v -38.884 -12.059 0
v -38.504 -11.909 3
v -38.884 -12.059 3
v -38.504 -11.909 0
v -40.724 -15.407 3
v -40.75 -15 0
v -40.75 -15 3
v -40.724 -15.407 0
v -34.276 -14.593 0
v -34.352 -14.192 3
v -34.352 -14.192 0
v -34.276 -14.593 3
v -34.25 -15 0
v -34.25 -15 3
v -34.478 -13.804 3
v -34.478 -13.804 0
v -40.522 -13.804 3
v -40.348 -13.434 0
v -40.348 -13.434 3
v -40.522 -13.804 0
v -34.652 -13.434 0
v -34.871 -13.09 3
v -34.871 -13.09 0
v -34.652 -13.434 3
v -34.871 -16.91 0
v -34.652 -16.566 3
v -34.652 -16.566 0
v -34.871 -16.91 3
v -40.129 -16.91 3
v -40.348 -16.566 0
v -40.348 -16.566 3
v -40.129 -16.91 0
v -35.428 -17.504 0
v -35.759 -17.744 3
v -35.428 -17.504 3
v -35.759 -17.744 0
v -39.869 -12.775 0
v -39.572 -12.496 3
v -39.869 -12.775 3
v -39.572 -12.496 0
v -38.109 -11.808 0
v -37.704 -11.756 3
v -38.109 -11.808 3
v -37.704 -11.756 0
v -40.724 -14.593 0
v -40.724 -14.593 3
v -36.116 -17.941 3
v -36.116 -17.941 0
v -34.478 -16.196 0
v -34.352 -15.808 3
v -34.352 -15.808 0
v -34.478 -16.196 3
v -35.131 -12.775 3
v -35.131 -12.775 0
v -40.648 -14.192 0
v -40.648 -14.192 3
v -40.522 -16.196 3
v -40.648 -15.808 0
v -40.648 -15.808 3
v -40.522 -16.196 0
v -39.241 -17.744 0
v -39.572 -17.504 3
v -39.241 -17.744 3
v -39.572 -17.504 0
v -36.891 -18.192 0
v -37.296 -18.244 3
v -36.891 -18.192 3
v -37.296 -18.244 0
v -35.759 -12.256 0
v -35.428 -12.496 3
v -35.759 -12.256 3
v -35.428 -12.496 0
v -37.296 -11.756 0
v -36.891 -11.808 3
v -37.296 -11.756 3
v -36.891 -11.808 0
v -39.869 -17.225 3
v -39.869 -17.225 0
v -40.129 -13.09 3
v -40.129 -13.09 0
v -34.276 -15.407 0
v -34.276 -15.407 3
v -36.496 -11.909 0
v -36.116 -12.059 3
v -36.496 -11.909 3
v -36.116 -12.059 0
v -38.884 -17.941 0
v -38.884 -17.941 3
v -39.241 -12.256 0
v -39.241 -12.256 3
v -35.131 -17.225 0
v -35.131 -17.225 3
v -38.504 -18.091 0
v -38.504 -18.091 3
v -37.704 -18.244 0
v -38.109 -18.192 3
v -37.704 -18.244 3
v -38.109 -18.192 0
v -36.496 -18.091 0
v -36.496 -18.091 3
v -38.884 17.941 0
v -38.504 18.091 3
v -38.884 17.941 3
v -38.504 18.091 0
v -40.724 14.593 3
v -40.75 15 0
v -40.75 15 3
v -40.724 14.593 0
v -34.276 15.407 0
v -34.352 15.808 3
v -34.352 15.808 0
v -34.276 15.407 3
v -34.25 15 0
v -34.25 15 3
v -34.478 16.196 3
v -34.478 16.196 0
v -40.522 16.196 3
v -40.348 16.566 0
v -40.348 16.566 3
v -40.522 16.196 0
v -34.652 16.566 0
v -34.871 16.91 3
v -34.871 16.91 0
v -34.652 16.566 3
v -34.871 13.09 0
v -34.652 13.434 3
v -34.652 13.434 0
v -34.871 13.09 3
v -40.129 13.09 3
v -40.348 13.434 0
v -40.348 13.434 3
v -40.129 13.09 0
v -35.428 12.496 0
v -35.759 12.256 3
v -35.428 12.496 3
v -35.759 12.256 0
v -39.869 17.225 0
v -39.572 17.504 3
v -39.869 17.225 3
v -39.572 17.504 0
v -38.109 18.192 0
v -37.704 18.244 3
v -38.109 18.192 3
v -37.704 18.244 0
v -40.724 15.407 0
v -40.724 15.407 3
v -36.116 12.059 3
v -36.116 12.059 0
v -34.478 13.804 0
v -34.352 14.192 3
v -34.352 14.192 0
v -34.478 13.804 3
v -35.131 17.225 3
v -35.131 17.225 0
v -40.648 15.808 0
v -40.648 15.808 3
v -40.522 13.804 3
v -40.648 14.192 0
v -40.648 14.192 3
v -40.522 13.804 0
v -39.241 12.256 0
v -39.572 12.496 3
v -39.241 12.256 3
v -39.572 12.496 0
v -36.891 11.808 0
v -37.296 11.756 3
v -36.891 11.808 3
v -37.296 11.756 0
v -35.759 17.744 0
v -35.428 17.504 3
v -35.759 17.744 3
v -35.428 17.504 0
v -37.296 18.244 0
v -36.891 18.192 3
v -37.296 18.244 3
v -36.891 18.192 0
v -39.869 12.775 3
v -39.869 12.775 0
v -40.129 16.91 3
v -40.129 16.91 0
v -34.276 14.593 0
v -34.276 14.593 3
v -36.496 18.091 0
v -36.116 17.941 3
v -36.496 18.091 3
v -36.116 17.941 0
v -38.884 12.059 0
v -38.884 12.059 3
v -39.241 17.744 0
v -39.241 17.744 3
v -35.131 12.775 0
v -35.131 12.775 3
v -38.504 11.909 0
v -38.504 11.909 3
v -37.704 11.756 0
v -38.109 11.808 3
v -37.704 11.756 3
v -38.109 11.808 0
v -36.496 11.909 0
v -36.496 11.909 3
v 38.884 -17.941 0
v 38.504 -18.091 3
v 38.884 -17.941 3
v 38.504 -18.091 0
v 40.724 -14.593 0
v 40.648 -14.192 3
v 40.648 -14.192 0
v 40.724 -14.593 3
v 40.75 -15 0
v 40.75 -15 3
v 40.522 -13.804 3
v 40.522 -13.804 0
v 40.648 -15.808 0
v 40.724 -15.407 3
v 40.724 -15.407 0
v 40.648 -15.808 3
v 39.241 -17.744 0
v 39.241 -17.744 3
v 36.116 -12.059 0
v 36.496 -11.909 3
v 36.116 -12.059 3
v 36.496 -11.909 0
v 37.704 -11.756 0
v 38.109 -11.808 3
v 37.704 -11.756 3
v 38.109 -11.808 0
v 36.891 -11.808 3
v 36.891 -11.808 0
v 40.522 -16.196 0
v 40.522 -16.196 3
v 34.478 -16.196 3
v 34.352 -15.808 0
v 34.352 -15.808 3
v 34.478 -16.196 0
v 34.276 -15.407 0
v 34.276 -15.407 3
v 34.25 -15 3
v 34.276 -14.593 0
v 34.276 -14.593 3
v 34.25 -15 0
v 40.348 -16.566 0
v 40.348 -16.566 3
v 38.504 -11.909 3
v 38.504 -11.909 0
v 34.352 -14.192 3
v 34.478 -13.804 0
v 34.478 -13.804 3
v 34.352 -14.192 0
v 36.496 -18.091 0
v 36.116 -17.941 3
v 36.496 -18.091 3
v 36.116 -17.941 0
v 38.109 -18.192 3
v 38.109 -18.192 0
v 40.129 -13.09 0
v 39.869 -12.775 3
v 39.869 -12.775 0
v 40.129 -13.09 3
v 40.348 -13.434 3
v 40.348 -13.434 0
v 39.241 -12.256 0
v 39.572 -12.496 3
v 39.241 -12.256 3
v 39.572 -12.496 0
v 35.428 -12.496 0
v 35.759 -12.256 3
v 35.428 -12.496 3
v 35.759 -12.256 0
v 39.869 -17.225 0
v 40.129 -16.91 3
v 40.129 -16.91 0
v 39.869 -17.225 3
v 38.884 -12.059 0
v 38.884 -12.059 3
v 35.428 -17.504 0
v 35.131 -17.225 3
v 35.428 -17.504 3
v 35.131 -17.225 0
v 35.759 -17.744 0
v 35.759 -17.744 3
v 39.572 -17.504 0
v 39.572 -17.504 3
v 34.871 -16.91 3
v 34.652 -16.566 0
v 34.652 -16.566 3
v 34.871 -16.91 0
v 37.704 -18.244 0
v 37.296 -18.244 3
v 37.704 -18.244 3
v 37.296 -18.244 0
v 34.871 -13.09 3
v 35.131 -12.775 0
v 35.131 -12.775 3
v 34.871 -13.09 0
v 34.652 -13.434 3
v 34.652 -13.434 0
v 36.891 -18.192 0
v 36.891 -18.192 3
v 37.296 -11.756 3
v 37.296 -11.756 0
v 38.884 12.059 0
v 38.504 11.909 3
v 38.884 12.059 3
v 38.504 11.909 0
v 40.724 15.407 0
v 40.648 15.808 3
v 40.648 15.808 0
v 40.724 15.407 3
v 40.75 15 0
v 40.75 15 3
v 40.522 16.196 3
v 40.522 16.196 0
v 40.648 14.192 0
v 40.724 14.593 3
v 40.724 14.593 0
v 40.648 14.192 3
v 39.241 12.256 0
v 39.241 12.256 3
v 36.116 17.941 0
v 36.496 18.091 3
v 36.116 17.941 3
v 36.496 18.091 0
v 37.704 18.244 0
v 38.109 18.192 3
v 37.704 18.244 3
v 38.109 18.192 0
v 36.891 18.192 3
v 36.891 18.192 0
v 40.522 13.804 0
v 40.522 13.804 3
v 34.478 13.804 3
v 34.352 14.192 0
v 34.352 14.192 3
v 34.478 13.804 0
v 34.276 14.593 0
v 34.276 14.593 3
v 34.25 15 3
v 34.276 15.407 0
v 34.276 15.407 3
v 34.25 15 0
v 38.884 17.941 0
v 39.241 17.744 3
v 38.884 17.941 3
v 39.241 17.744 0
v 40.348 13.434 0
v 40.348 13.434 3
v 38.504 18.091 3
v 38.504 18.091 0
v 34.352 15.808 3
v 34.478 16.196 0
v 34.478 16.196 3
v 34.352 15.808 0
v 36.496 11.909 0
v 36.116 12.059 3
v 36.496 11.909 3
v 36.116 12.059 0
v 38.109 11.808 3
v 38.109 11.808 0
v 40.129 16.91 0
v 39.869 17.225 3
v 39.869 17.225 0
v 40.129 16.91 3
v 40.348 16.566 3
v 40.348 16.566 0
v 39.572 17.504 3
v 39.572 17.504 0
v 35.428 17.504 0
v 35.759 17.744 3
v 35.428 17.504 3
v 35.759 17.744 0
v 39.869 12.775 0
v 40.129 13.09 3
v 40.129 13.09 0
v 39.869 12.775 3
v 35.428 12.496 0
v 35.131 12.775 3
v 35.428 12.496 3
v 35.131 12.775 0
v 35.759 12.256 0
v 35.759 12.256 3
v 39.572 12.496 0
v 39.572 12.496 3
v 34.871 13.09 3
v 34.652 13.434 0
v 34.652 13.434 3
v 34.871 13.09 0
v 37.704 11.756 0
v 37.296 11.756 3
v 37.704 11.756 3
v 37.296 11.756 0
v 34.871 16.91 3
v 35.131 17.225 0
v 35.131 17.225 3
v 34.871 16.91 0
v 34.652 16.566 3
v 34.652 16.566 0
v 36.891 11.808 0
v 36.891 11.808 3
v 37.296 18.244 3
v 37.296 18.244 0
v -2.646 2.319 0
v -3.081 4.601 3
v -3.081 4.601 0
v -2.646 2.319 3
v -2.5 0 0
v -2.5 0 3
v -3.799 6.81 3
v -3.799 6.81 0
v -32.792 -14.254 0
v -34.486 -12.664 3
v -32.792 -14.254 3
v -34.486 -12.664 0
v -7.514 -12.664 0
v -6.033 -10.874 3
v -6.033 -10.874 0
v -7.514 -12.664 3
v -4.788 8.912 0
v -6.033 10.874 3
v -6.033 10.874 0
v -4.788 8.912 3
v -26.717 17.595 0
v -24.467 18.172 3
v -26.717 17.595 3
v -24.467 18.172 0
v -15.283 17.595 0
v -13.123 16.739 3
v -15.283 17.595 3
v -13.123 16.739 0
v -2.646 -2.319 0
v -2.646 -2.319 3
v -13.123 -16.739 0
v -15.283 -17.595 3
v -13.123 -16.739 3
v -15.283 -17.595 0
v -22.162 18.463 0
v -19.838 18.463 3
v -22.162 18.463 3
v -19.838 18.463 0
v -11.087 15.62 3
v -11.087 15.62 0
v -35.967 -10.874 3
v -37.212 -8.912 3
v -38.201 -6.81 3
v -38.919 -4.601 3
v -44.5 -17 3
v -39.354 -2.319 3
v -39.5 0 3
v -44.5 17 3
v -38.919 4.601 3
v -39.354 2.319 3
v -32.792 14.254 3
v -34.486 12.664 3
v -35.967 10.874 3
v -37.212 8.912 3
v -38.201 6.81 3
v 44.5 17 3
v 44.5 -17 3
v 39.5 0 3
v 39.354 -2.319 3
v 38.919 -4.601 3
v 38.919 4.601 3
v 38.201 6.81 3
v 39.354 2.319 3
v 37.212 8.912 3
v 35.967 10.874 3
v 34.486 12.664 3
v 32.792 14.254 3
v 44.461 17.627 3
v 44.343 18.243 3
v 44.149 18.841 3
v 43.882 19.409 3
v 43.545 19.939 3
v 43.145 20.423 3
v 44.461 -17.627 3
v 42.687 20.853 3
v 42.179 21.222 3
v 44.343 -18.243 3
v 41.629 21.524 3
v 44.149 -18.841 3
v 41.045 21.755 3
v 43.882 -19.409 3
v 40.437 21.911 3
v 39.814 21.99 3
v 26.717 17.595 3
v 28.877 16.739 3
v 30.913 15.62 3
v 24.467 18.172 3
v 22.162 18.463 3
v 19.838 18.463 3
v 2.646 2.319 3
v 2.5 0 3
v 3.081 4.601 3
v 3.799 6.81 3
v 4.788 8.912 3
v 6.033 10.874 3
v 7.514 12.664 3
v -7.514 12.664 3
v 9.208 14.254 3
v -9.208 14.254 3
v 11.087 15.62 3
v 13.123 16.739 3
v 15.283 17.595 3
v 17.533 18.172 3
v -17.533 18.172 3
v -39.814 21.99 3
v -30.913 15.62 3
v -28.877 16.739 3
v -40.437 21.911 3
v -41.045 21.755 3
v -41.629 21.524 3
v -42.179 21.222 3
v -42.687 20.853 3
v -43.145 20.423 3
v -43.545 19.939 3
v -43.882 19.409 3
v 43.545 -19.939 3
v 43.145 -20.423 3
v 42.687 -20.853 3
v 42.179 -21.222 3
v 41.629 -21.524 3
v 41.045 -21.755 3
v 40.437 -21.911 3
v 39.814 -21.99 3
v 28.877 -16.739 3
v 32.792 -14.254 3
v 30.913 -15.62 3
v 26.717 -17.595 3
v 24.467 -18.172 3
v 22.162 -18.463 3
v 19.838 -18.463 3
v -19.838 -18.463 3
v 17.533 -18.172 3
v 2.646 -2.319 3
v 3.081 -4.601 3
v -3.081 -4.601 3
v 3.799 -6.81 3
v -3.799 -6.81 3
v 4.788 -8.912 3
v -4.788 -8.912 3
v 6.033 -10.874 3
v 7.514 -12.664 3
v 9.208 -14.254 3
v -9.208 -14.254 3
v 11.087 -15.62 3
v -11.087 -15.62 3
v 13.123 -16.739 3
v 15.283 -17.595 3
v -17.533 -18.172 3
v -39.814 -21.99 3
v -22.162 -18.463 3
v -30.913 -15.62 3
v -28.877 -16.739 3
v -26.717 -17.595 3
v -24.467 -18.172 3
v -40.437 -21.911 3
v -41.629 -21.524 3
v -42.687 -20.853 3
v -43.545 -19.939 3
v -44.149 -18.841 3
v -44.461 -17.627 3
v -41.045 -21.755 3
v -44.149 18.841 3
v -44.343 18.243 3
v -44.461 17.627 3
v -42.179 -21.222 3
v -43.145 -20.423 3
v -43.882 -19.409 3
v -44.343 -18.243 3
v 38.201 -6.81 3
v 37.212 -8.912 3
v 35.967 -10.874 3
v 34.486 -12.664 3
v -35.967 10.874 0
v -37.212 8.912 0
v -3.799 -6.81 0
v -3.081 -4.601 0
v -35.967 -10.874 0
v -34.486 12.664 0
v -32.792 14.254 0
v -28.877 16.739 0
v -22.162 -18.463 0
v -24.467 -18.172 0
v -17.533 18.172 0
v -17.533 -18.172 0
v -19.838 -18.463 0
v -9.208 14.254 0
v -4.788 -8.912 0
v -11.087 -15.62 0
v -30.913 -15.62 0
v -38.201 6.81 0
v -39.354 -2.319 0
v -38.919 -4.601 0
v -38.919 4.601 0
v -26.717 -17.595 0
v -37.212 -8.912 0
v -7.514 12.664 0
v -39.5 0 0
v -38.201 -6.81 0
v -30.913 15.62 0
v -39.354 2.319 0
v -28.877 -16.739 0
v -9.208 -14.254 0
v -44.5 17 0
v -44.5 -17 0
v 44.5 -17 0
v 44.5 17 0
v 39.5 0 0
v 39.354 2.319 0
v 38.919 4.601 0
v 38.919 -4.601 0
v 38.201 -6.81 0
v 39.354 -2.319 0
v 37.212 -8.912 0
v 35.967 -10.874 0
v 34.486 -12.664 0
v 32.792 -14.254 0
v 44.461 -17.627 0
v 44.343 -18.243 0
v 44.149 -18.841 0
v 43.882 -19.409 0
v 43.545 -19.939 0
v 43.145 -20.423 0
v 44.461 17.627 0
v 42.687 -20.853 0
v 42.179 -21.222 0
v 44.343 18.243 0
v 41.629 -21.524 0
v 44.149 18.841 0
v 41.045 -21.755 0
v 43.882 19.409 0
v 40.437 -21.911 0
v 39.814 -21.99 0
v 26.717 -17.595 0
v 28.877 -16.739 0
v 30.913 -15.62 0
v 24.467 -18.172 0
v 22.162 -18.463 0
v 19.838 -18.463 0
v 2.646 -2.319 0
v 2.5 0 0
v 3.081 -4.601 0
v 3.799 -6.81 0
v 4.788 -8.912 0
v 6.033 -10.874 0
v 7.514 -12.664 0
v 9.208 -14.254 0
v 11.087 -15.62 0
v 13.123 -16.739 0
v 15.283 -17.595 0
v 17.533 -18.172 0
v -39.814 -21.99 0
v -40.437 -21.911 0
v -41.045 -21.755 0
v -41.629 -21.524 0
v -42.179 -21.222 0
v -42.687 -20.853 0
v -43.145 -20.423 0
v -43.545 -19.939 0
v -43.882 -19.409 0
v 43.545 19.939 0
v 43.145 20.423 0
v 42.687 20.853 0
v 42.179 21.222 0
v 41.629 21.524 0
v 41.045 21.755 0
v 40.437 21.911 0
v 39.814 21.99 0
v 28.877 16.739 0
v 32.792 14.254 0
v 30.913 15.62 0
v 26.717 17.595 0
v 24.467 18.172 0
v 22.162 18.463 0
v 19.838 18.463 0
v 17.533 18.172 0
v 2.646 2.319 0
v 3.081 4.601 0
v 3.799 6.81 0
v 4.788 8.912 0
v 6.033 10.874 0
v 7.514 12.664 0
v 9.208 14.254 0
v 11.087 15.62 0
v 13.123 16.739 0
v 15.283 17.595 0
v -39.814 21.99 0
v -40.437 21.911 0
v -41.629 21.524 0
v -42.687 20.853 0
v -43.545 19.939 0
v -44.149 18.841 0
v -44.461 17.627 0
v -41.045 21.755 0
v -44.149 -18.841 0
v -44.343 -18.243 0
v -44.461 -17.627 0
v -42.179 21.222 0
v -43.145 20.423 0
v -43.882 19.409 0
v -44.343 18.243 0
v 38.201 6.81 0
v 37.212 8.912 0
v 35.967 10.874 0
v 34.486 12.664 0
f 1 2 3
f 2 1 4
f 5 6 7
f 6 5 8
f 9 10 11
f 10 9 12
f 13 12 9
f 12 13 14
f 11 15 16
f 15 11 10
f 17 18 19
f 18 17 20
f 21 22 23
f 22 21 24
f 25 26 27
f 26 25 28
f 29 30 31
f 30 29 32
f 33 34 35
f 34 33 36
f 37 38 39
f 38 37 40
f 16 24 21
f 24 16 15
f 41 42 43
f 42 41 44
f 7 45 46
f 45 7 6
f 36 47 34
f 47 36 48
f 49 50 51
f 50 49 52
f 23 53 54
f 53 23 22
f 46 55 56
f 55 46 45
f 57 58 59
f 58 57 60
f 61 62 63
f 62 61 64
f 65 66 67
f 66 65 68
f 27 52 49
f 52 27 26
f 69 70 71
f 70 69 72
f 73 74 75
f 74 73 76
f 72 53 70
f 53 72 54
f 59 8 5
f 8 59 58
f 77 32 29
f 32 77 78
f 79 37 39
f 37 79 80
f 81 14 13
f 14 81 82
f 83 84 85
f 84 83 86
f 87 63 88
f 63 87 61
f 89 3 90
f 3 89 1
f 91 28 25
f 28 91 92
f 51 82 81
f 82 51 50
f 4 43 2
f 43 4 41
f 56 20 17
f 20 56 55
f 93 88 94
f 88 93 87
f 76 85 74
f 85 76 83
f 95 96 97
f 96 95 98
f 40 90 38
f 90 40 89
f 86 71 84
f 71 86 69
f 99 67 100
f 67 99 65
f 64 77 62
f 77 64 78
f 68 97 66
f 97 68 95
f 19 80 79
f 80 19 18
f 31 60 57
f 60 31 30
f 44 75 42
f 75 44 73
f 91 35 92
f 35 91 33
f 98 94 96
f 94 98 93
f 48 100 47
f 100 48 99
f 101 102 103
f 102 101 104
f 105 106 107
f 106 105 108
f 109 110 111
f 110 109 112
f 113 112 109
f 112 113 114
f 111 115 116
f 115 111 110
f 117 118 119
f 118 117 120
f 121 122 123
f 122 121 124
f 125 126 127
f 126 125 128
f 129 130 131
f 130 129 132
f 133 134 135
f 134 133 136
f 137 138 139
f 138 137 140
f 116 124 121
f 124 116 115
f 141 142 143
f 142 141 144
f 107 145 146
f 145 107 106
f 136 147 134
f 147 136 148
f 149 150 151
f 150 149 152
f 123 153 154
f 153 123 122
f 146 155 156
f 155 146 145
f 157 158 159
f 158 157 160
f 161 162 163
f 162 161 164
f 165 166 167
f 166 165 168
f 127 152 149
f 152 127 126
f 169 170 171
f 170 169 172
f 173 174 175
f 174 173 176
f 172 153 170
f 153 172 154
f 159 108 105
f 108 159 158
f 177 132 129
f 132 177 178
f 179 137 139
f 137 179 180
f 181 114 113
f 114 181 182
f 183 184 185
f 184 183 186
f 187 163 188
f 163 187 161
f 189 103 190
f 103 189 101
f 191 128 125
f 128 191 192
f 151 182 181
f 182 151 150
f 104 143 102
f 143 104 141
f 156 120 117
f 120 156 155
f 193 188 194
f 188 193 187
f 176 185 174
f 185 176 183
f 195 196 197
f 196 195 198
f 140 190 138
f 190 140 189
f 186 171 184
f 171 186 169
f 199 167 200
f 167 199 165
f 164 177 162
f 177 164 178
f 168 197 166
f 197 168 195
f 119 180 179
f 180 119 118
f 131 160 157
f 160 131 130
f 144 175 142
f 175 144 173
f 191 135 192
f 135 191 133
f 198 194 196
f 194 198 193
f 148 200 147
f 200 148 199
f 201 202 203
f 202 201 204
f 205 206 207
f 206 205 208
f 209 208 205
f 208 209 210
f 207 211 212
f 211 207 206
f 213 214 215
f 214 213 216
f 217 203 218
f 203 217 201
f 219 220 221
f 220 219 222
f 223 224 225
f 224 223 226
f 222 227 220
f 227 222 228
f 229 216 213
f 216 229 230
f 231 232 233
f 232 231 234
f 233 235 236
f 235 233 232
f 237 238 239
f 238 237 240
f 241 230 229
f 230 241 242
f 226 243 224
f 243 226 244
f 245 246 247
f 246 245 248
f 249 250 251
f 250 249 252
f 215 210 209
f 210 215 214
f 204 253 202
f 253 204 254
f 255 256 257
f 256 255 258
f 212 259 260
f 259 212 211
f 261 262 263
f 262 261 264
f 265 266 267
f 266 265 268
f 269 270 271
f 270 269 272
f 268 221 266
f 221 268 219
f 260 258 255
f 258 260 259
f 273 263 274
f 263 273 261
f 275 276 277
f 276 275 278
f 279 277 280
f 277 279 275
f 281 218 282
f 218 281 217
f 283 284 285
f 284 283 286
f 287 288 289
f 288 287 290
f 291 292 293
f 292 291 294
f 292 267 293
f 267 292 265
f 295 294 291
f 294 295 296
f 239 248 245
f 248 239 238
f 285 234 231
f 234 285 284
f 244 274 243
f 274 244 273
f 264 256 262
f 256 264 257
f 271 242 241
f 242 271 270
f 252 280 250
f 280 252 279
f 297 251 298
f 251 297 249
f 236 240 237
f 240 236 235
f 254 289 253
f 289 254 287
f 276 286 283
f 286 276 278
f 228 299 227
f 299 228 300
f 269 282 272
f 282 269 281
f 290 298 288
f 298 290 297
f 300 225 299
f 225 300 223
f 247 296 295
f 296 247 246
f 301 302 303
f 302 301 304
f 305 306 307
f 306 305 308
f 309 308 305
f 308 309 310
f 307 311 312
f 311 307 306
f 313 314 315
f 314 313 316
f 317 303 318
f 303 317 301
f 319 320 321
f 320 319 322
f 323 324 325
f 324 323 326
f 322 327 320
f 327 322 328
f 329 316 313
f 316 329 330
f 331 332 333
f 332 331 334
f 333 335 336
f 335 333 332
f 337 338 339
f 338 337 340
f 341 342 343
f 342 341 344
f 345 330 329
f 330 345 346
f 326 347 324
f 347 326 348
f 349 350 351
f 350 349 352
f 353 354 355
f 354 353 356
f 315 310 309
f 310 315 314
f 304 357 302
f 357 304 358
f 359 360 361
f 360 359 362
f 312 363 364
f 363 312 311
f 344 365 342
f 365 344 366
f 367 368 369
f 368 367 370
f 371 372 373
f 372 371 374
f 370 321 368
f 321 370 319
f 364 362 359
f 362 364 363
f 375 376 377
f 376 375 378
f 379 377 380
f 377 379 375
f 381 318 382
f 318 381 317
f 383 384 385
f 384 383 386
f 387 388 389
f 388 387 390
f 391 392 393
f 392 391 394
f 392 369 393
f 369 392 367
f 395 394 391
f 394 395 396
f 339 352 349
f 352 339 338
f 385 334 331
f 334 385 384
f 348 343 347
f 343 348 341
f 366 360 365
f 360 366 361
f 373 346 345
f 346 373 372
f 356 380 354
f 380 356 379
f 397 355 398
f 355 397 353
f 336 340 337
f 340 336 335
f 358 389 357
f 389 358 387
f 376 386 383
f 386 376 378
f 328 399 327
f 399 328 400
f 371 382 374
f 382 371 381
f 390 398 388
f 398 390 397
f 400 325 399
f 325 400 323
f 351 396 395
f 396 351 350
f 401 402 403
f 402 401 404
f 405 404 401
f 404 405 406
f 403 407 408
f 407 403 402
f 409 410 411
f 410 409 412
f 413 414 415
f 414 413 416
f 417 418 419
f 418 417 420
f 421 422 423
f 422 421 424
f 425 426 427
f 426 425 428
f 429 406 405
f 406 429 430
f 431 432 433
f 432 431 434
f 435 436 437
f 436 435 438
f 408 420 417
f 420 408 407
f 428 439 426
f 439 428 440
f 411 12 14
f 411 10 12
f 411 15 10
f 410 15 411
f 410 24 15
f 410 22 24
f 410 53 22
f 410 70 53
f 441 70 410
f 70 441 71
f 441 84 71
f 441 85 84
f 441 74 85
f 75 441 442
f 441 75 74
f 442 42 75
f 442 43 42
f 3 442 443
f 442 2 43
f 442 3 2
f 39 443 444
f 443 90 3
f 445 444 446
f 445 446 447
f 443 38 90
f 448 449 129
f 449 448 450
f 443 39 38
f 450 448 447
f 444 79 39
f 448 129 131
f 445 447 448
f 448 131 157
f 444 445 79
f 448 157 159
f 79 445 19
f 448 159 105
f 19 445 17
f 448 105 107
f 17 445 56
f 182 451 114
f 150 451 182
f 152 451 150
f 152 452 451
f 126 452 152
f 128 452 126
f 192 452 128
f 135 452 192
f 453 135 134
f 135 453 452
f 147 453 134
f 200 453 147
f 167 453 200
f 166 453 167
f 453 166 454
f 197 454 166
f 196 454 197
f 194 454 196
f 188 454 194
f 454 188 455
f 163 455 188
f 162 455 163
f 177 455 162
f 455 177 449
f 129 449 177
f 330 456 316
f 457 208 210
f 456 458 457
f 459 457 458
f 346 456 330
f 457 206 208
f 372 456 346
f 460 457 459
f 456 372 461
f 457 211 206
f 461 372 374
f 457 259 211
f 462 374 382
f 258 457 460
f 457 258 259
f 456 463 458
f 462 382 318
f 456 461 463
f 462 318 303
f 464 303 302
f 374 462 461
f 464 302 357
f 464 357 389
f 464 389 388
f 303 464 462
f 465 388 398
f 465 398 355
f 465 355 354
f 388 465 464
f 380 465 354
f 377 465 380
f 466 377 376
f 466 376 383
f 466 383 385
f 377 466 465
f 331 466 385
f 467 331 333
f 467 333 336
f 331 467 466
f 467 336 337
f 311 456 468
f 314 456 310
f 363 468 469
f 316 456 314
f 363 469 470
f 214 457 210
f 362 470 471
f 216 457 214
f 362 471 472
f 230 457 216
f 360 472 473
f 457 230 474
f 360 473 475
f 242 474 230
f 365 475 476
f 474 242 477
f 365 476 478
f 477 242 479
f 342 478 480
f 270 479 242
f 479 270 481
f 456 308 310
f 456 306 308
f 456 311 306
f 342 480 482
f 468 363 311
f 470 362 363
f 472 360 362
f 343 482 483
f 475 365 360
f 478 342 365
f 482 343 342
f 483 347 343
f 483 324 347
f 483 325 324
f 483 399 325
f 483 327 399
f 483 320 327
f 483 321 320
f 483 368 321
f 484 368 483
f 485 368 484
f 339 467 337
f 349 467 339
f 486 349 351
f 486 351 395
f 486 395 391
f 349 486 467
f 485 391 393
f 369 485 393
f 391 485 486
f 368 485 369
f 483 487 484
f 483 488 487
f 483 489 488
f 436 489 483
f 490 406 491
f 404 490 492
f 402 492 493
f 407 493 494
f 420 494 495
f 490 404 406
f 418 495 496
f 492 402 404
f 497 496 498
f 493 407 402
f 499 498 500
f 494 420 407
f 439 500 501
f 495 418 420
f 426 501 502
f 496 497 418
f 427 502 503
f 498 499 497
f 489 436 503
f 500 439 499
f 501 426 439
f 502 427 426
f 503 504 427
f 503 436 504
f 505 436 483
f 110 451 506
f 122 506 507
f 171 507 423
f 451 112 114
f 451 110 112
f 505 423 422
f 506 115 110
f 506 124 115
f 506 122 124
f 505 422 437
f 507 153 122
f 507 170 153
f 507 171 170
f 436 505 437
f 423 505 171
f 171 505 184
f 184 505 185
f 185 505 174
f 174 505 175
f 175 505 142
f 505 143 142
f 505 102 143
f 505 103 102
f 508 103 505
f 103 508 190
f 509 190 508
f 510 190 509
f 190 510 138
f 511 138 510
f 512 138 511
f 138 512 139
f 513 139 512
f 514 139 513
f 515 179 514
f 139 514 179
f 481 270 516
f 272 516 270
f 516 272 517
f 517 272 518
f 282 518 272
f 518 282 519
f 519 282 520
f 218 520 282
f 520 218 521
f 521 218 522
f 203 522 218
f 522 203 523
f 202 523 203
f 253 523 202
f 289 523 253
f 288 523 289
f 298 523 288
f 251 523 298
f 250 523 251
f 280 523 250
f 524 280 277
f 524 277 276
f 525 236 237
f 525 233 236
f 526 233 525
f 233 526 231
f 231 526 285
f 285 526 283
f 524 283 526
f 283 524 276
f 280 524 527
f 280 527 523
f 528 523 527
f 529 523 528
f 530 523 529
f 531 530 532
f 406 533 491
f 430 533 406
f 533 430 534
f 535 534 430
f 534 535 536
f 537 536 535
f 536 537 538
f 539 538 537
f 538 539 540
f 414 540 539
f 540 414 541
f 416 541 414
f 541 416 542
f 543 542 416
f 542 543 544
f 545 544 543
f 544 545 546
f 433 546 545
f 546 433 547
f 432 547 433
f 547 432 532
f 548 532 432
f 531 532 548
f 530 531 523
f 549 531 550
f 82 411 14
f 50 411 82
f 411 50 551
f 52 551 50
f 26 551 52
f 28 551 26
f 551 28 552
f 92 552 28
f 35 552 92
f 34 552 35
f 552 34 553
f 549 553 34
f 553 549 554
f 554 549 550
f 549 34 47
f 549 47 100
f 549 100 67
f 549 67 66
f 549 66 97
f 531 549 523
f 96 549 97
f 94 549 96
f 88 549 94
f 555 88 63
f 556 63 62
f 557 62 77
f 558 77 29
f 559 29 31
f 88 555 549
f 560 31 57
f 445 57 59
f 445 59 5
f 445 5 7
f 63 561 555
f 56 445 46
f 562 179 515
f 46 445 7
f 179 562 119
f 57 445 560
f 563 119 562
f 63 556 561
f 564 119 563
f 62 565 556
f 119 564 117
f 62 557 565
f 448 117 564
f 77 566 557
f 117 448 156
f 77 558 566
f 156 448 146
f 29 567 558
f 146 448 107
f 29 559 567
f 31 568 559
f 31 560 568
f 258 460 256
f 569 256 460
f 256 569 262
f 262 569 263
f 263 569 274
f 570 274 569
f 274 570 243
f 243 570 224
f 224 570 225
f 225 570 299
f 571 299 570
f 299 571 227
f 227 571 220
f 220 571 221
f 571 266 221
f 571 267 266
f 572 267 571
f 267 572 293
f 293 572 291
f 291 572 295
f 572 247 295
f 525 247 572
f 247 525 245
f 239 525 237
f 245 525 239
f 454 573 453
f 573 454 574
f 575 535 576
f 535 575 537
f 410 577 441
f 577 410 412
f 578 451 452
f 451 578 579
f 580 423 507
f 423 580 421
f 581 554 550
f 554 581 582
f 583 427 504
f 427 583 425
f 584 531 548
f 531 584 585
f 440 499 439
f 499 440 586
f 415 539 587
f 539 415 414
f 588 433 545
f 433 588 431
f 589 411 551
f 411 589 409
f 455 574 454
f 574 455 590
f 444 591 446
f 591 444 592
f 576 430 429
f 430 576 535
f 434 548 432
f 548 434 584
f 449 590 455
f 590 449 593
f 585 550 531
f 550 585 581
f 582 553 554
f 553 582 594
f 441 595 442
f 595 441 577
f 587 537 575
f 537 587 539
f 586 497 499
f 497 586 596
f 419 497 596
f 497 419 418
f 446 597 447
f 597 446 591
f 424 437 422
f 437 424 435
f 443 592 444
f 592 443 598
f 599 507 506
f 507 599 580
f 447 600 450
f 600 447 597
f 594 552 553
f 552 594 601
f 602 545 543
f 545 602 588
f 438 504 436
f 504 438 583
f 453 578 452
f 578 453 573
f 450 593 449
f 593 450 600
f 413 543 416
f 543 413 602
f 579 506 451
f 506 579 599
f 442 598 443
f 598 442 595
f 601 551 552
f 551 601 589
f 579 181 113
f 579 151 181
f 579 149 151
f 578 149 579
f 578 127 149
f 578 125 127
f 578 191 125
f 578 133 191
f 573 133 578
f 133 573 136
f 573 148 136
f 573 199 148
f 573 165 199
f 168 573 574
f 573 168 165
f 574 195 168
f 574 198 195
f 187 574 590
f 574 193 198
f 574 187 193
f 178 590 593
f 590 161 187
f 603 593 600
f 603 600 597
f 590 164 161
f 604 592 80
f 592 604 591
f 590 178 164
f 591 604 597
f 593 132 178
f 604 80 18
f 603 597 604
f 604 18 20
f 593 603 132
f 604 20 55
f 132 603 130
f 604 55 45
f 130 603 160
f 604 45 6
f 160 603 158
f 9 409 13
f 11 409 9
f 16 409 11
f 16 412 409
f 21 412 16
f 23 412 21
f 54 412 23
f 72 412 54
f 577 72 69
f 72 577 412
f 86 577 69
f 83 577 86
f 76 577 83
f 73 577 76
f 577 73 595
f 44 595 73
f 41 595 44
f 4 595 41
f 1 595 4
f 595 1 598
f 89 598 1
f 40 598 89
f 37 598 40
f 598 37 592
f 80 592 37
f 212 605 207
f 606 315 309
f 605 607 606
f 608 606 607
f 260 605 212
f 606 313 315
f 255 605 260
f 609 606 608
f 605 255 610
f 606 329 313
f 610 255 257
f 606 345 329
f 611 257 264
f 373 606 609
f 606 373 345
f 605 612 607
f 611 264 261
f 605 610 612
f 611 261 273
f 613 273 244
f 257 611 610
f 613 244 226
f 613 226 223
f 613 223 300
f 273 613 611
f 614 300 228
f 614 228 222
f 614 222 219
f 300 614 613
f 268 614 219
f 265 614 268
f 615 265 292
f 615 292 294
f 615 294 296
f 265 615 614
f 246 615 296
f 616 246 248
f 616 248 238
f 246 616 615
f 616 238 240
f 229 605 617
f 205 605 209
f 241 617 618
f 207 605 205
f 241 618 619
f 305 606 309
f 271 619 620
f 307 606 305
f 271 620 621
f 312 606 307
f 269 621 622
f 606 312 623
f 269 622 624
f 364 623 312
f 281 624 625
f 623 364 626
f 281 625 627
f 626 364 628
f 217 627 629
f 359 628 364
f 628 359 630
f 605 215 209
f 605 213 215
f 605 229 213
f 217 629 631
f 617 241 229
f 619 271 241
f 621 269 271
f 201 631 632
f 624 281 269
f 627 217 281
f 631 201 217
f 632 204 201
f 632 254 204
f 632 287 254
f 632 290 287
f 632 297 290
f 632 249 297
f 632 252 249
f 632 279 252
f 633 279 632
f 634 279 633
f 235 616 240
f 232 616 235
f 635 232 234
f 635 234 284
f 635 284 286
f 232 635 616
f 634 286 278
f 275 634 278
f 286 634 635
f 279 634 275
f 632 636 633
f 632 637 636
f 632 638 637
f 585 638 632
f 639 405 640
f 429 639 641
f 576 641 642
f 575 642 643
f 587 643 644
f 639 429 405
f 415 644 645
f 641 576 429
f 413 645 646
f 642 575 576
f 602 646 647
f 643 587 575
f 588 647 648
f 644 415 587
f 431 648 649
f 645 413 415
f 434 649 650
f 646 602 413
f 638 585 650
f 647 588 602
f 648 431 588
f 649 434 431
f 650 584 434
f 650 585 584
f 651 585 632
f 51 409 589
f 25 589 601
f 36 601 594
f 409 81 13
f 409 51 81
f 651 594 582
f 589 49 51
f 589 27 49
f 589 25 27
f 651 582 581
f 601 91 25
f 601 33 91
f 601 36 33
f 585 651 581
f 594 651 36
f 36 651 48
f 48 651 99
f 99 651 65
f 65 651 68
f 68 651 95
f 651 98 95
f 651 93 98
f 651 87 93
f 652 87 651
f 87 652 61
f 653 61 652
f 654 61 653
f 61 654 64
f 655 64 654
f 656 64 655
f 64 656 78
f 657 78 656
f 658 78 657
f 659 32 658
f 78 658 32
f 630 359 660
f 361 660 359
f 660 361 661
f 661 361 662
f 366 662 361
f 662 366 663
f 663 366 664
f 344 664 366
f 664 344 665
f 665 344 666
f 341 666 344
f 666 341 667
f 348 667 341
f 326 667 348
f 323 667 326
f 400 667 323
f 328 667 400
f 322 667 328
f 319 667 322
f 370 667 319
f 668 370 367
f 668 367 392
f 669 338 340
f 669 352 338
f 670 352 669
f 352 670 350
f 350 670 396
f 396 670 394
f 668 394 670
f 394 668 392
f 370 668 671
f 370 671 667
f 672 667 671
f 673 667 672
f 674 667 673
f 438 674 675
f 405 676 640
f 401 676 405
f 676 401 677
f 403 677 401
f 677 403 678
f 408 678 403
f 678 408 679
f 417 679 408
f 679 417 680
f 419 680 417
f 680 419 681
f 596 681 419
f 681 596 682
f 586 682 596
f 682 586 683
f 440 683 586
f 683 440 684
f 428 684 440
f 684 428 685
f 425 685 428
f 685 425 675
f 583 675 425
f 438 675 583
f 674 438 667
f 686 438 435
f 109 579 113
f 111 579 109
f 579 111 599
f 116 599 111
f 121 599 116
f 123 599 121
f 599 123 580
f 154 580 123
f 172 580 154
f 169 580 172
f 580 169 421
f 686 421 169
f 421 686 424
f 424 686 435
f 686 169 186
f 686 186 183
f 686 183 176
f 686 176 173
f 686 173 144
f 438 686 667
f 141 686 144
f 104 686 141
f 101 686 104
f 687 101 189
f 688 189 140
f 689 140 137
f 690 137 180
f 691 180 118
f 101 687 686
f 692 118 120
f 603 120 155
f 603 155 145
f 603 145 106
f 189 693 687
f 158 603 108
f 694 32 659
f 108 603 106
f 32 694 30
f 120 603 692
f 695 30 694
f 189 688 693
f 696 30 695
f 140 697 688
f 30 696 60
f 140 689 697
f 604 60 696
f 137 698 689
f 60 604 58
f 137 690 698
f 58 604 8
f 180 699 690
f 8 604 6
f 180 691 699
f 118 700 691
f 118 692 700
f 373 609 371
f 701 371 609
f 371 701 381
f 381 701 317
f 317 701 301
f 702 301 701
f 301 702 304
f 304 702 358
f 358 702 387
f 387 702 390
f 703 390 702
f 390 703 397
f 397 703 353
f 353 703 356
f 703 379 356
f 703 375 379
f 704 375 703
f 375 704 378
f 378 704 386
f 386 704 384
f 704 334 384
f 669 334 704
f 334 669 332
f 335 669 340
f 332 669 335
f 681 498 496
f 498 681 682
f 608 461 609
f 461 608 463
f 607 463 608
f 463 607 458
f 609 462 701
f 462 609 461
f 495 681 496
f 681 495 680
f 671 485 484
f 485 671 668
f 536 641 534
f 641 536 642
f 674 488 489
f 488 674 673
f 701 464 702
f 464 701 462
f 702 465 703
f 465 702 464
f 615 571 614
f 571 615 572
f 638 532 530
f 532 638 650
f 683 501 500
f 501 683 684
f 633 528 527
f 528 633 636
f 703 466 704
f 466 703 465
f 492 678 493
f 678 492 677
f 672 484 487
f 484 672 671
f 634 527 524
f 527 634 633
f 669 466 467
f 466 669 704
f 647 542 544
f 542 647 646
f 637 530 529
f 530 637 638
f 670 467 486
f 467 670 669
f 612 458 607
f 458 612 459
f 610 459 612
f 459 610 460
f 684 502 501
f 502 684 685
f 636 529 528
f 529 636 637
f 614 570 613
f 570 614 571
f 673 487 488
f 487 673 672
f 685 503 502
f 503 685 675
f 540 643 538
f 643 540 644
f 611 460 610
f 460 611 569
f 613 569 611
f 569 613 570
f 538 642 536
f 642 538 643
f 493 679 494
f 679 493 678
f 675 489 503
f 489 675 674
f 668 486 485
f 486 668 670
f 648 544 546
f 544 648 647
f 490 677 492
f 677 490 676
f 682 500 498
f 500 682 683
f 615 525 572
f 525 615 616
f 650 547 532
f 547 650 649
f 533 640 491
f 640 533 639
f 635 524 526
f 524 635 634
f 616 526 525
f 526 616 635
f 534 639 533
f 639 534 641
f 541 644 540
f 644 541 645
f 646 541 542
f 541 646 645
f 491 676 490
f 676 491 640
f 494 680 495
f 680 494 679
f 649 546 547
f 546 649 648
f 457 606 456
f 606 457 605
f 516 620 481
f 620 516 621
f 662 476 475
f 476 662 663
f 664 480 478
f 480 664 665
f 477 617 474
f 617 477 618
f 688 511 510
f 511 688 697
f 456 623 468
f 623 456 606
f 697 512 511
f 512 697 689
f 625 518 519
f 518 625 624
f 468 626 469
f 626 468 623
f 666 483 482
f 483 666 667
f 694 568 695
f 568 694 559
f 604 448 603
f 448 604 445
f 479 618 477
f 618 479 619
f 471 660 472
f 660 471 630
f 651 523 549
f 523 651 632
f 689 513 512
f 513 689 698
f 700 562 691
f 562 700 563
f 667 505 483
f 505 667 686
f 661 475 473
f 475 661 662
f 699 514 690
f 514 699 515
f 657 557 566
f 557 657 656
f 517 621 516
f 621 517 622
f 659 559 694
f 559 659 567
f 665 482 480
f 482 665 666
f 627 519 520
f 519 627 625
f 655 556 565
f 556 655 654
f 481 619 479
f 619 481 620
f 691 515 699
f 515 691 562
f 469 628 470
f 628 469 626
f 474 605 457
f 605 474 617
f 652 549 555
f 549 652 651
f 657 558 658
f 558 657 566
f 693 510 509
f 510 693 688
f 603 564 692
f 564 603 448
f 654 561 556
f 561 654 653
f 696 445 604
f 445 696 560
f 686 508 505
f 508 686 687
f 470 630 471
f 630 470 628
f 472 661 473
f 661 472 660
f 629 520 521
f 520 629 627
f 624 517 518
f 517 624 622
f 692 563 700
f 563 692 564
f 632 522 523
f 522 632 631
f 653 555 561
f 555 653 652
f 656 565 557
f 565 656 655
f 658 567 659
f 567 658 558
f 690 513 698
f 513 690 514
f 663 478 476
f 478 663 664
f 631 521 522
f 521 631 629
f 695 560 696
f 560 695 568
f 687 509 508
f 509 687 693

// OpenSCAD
$fn = 50;


difference() {
	union() {
		hull() {
			translate(v = [-39.5000000000, 17.0000000000, 0]) {
				cylinder(h = 3, r = 5);
			}
			translate(v = [39.5000000000, 17.0000000000, 0]) {
				cylinder(h = 3, r = 5);
			}
			translate(v = [-39.5000000000, -17.0000000000, 0]) {
				cylinder(h = 3, r = 5);
			}
			translate(v = [39.5000000000, -17.0000000000, 0]) {
				cylinder(h = 3, r = 5);
			}
		}
	}
	union() {
		#translate(v = [-37.5000000000, -15.0000000000, -100.0000000000]) {
			cylinder(h = 200, r = 3.2500000000);
		}
		#translate(v = [-37.5000000000, 15.0000000000, -100.0000000000]) {
			cylinder(h = 200, r = 3.2500000000);
		}
		#translate(v = [37.5000000000, -15.0000000000, -100.0000000000]) {
			cylinder(h = 200, r = 3.2500000000);
		}
		#translate(v = [37.5000000000, 15.0000000000, -100.0000000000]) {
			cylinder(h = 200, r = 3.2500000000);
		}
		#translate(v = [-21.0000000000, 0, 0]) {
			cylinder(h = 3, r = 18.5000000000);
		}
		#translate(v = [21.0000000000, 0, 0]) {
			cylinder(h = 3, r = 18.5000000000);
		}
	}
}
